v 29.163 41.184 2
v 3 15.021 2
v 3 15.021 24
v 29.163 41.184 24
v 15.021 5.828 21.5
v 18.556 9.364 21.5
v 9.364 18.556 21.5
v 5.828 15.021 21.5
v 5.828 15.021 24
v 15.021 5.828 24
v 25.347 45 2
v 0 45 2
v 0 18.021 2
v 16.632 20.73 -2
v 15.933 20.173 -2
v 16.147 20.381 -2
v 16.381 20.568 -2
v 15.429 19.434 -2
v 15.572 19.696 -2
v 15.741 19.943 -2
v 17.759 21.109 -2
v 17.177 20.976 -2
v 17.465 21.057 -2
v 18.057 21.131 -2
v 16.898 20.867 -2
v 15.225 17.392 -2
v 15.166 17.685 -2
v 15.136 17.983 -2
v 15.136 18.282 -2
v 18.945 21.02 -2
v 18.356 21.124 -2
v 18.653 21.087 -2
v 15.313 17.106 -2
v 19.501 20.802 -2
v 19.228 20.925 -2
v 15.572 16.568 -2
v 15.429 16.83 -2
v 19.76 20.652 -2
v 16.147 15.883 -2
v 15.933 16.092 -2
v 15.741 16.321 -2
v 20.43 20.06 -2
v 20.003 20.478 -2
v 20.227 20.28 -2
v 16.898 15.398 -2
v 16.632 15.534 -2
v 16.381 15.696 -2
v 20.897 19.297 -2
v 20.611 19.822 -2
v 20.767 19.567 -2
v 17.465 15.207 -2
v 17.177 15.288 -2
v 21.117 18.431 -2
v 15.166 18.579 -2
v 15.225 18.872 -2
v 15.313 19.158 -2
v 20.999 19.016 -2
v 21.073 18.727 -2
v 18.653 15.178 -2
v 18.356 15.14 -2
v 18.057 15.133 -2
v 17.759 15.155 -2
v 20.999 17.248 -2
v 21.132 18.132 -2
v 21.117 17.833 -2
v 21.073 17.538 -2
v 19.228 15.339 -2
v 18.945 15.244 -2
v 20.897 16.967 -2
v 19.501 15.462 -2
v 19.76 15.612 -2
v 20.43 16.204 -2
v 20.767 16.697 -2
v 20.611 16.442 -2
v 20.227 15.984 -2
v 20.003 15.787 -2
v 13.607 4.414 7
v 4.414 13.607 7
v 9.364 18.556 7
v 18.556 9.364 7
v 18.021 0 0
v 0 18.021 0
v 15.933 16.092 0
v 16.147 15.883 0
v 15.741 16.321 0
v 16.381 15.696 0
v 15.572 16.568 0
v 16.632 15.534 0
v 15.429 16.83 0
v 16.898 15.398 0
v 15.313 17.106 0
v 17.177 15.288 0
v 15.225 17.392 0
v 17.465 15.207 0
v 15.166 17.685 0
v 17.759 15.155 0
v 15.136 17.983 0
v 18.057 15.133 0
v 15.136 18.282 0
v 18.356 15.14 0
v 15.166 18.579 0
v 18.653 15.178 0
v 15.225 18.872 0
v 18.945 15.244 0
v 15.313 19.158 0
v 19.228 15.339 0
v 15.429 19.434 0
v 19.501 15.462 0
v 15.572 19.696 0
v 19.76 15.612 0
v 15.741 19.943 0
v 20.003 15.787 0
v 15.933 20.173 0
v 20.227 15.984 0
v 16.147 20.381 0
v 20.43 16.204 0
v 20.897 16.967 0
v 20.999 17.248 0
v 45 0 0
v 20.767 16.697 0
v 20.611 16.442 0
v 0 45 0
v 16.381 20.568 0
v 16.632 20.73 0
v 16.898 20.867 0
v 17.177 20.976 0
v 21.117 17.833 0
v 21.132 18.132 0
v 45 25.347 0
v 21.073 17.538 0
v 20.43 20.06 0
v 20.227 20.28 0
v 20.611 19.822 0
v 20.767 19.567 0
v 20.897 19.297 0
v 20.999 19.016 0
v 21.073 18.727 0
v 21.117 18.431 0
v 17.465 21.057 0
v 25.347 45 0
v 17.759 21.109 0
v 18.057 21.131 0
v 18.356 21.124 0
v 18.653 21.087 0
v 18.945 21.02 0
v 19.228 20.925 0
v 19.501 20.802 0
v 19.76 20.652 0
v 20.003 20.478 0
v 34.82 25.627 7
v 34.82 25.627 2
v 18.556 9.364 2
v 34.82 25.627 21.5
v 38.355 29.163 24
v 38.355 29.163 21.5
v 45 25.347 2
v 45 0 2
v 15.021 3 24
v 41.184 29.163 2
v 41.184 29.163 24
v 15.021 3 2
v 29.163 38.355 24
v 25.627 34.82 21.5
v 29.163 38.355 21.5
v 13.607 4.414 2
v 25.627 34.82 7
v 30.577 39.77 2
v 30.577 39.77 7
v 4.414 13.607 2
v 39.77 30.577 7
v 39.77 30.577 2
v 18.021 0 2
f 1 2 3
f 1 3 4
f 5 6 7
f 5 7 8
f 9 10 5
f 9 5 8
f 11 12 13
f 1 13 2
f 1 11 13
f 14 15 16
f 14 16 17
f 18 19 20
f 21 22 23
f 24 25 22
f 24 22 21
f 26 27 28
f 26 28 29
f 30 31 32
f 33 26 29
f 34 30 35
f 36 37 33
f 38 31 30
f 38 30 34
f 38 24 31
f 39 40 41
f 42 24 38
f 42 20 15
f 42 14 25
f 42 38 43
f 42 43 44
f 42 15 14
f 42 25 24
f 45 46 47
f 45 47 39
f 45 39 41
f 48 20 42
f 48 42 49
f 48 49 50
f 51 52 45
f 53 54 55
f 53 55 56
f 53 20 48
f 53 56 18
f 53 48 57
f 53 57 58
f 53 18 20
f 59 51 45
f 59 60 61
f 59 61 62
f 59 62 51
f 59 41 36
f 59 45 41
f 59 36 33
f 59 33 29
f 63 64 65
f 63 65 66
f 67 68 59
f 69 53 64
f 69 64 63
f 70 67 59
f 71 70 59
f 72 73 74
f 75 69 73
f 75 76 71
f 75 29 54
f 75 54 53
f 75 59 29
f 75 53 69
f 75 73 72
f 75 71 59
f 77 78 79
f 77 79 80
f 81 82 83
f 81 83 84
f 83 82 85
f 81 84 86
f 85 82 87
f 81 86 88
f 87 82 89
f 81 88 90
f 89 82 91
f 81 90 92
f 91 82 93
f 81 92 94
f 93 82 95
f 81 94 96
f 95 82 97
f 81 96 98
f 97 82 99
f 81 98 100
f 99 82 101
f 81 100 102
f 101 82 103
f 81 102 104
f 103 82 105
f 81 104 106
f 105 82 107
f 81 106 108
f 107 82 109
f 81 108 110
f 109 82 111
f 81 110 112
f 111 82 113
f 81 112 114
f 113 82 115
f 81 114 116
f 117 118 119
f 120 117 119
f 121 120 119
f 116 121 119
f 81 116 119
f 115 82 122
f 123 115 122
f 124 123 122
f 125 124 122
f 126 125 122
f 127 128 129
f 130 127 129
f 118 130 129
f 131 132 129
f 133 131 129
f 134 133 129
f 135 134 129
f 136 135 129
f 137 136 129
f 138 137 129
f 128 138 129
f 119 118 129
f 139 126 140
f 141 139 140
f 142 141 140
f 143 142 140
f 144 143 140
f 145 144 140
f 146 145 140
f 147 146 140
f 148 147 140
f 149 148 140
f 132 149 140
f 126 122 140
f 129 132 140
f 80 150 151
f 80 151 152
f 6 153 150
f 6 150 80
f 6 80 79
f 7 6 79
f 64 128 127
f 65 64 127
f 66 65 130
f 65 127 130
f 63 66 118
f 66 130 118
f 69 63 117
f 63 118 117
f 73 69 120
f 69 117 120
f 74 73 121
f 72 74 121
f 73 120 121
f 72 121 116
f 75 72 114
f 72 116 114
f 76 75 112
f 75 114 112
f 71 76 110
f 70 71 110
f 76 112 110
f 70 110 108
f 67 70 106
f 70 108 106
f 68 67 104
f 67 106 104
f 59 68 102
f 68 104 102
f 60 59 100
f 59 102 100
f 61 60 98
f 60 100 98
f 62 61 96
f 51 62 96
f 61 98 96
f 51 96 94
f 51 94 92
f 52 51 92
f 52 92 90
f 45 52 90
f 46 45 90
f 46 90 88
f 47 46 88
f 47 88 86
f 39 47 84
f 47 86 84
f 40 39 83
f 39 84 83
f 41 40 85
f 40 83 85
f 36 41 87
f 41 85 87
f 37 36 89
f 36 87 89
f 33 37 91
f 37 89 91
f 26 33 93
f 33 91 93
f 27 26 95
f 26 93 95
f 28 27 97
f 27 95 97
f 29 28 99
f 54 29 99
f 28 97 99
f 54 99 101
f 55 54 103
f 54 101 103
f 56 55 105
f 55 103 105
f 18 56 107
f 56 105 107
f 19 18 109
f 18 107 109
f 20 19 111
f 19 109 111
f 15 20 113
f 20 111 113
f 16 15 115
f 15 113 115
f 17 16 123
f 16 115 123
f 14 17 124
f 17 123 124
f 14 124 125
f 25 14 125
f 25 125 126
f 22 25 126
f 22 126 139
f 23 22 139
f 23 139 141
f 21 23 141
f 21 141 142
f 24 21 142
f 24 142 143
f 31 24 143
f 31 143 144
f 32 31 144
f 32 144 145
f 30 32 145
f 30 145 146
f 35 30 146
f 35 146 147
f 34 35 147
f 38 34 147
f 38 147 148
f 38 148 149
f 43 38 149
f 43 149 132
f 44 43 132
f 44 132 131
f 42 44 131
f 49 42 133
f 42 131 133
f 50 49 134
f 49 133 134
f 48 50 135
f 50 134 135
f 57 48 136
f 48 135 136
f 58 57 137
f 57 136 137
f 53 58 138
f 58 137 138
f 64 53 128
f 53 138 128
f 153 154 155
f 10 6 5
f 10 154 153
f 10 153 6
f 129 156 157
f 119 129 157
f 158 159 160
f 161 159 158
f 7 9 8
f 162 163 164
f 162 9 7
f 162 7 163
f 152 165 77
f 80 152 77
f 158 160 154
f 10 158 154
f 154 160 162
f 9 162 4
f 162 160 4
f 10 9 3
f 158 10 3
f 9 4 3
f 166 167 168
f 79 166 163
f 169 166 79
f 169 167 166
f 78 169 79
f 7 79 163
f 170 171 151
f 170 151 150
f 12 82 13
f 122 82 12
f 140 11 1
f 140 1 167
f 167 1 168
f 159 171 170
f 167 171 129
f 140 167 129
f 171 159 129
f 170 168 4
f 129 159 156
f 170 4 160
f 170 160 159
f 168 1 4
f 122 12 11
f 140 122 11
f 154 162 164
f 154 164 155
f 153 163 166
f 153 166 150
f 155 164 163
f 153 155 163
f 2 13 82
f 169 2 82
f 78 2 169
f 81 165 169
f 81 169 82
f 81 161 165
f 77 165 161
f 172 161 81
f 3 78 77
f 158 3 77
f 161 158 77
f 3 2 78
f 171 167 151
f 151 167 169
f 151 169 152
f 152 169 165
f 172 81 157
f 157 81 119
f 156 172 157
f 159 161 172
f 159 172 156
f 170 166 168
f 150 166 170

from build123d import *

# Parameters (mm, degrees)
SKETCH_W        = 100
SKETCH_H        = 140
PAD_DEPTH       = 2
PAD001_DEPTH    = 22
POCKET_DEPTH    = 2.5
POCKET001_DEPTH = 19.5
POCKET002_DEPTH = 2.001
SKETCH005_R     = 3
PAD002_DEPTH    = 2
SKETCH006_W     = 13
SKETCH006_H     = 5
POCKET003_DEPTH = 50.8979696197


with BuildPart() as part:
    # Sketch → Pad (new body)
    with BuildSketch(Plane.XY):
        with Locations((50, 70)):
            Rectangle(SKETCH_W, SKETCH_H)
    extrude(amount=PAD_DEPTH)

    # Sketch001 (on Face6 of Pad) → Pad001 (join)
    with BuildSketch(Plane.XY.offset(2)):
        Polygon((3, 15.0208152802), (29.162950904, 41.1837661841), (41.1837661842, 29.1629509039), (15.0208152802, 3), align=None)
    extrude(amount=PAD001_DEPTH)

    # Sketch002 (on Face11 of Pad001) → Pocket (cut)
    with BuildSketch(Plane.XY.offset(24)):
        Polygon((5.8284271247, 15.0208152802), (29.162950904, 38.3553390594), (38.3553390594, 29.1629509039), (15.0208152802, 5.8284271247), align=None)
    extrude(amount=-POCKET_DEPTH, mode=Mode.SUBTRACT)

    # Sketch003 (on Face16 of Pocket) → Pocket001 (cut)
    with BuildSketch(Plane.XY.offset(21.5)):
        Polygon((9.3639610307, 18.5563491861), (25.627416998, 34.8198051534), (34.8198051534, 25.6274169979), (18.5563491861, 9.3639610307), align=None)
    extrude(amount=-POCKET001_DEPTH, mode=Mode.SUBTRACT)

    # Sketch004 (on Face5 of Pocket001) → Pocket002 (cut, through all)
    with BuildSketch(Plane.XY.offset(2)):
        Polygon((-2.5188567426, 20.5396720228), (19.697648952, -1.6768336718), (-2.5188567426, -1.6768336718), align=None)
        Polygon((-7.257704, 45), (25.3467170881, 45), (45, 25.3467170881), (45, -9.128844), (123.673981, -9.128844), (123.673981, 160.15947), (-17.63995, 152.949585), align=None)
    extrude(amount=-POCKET002_DEPTH, mode=Mode.SUBTRACT)

    # Sketch005 (on Face2 of Pocket002) → Pad002 (join)
    with BuildSketch(Plane(origin=(0, 0, 0), x_dir=(1, 0, 0), z_dir=(0, 0, -1))):
        with Locations((18.1320851174, -18.1320851174)):
            Circle(SKETCH005_R)
    extrude(amount=PAD002_DEPTH)

    # Sketch006 (on Face11 of Pad002) → Pocket003 (cut, through all)
    with BuildSketch(Plane(origin=(9.0104076401, 9.0104076401, 0), x_dir=(0.7071067812, -0.7071067812, 0), z_dir=(-0.7071067812, -0.7071067812, 0))):
        with Locations((0, 4.5)):
            Rectangle(SKETCH006_W, SKETCH006_H)
    extrude(amount=-POCKET003_DEPTH, mode=Mode.SUBTRACT)


solid = part.part
